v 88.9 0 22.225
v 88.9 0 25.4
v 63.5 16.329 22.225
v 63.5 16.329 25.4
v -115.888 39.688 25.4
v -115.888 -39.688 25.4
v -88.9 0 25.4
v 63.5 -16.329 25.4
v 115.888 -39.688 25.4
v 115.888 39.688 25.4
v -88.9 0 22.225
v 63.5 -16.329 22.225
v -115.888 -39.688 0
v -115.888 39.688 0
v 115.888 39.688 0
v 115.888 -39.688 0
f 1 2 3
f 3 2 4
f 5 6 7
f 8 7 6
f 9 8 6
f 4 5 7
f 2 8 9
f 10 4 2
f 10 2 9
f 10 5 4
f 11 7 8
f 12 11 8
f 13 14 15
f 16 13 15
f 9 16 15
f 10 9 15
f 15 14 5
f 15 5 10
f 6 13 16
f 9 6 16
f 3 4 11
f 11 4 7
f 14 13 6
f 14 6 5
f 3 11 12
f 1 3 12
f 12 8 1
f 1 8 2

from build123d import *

# Parameters (mm, degrees)
F0_W     = 231.775
F0_H     = 79.375
F1_DEPTH = 25.4
F3_DEPTH = 3.175


with BuildPart() as f1:
    # F0 (on Top) → F1 (new body)
    with BuildSketch(Plane.XY):
        Rectangle(F0_W, F0_H)
    extrude(amount=F1_DEPTH)

    # F2 (on face) → F3 (cut)
    with BuildSketch(Plane.XY.offset(25.4)):
        Polygon((63.5, 16.328571), (-88.9, 0), (63.5, -16.328571), (88.9, 0), align=None)
    extrude(amount=-F3_DEPTH, mode=Mode.SUBTRACT)


solid = f1.part
